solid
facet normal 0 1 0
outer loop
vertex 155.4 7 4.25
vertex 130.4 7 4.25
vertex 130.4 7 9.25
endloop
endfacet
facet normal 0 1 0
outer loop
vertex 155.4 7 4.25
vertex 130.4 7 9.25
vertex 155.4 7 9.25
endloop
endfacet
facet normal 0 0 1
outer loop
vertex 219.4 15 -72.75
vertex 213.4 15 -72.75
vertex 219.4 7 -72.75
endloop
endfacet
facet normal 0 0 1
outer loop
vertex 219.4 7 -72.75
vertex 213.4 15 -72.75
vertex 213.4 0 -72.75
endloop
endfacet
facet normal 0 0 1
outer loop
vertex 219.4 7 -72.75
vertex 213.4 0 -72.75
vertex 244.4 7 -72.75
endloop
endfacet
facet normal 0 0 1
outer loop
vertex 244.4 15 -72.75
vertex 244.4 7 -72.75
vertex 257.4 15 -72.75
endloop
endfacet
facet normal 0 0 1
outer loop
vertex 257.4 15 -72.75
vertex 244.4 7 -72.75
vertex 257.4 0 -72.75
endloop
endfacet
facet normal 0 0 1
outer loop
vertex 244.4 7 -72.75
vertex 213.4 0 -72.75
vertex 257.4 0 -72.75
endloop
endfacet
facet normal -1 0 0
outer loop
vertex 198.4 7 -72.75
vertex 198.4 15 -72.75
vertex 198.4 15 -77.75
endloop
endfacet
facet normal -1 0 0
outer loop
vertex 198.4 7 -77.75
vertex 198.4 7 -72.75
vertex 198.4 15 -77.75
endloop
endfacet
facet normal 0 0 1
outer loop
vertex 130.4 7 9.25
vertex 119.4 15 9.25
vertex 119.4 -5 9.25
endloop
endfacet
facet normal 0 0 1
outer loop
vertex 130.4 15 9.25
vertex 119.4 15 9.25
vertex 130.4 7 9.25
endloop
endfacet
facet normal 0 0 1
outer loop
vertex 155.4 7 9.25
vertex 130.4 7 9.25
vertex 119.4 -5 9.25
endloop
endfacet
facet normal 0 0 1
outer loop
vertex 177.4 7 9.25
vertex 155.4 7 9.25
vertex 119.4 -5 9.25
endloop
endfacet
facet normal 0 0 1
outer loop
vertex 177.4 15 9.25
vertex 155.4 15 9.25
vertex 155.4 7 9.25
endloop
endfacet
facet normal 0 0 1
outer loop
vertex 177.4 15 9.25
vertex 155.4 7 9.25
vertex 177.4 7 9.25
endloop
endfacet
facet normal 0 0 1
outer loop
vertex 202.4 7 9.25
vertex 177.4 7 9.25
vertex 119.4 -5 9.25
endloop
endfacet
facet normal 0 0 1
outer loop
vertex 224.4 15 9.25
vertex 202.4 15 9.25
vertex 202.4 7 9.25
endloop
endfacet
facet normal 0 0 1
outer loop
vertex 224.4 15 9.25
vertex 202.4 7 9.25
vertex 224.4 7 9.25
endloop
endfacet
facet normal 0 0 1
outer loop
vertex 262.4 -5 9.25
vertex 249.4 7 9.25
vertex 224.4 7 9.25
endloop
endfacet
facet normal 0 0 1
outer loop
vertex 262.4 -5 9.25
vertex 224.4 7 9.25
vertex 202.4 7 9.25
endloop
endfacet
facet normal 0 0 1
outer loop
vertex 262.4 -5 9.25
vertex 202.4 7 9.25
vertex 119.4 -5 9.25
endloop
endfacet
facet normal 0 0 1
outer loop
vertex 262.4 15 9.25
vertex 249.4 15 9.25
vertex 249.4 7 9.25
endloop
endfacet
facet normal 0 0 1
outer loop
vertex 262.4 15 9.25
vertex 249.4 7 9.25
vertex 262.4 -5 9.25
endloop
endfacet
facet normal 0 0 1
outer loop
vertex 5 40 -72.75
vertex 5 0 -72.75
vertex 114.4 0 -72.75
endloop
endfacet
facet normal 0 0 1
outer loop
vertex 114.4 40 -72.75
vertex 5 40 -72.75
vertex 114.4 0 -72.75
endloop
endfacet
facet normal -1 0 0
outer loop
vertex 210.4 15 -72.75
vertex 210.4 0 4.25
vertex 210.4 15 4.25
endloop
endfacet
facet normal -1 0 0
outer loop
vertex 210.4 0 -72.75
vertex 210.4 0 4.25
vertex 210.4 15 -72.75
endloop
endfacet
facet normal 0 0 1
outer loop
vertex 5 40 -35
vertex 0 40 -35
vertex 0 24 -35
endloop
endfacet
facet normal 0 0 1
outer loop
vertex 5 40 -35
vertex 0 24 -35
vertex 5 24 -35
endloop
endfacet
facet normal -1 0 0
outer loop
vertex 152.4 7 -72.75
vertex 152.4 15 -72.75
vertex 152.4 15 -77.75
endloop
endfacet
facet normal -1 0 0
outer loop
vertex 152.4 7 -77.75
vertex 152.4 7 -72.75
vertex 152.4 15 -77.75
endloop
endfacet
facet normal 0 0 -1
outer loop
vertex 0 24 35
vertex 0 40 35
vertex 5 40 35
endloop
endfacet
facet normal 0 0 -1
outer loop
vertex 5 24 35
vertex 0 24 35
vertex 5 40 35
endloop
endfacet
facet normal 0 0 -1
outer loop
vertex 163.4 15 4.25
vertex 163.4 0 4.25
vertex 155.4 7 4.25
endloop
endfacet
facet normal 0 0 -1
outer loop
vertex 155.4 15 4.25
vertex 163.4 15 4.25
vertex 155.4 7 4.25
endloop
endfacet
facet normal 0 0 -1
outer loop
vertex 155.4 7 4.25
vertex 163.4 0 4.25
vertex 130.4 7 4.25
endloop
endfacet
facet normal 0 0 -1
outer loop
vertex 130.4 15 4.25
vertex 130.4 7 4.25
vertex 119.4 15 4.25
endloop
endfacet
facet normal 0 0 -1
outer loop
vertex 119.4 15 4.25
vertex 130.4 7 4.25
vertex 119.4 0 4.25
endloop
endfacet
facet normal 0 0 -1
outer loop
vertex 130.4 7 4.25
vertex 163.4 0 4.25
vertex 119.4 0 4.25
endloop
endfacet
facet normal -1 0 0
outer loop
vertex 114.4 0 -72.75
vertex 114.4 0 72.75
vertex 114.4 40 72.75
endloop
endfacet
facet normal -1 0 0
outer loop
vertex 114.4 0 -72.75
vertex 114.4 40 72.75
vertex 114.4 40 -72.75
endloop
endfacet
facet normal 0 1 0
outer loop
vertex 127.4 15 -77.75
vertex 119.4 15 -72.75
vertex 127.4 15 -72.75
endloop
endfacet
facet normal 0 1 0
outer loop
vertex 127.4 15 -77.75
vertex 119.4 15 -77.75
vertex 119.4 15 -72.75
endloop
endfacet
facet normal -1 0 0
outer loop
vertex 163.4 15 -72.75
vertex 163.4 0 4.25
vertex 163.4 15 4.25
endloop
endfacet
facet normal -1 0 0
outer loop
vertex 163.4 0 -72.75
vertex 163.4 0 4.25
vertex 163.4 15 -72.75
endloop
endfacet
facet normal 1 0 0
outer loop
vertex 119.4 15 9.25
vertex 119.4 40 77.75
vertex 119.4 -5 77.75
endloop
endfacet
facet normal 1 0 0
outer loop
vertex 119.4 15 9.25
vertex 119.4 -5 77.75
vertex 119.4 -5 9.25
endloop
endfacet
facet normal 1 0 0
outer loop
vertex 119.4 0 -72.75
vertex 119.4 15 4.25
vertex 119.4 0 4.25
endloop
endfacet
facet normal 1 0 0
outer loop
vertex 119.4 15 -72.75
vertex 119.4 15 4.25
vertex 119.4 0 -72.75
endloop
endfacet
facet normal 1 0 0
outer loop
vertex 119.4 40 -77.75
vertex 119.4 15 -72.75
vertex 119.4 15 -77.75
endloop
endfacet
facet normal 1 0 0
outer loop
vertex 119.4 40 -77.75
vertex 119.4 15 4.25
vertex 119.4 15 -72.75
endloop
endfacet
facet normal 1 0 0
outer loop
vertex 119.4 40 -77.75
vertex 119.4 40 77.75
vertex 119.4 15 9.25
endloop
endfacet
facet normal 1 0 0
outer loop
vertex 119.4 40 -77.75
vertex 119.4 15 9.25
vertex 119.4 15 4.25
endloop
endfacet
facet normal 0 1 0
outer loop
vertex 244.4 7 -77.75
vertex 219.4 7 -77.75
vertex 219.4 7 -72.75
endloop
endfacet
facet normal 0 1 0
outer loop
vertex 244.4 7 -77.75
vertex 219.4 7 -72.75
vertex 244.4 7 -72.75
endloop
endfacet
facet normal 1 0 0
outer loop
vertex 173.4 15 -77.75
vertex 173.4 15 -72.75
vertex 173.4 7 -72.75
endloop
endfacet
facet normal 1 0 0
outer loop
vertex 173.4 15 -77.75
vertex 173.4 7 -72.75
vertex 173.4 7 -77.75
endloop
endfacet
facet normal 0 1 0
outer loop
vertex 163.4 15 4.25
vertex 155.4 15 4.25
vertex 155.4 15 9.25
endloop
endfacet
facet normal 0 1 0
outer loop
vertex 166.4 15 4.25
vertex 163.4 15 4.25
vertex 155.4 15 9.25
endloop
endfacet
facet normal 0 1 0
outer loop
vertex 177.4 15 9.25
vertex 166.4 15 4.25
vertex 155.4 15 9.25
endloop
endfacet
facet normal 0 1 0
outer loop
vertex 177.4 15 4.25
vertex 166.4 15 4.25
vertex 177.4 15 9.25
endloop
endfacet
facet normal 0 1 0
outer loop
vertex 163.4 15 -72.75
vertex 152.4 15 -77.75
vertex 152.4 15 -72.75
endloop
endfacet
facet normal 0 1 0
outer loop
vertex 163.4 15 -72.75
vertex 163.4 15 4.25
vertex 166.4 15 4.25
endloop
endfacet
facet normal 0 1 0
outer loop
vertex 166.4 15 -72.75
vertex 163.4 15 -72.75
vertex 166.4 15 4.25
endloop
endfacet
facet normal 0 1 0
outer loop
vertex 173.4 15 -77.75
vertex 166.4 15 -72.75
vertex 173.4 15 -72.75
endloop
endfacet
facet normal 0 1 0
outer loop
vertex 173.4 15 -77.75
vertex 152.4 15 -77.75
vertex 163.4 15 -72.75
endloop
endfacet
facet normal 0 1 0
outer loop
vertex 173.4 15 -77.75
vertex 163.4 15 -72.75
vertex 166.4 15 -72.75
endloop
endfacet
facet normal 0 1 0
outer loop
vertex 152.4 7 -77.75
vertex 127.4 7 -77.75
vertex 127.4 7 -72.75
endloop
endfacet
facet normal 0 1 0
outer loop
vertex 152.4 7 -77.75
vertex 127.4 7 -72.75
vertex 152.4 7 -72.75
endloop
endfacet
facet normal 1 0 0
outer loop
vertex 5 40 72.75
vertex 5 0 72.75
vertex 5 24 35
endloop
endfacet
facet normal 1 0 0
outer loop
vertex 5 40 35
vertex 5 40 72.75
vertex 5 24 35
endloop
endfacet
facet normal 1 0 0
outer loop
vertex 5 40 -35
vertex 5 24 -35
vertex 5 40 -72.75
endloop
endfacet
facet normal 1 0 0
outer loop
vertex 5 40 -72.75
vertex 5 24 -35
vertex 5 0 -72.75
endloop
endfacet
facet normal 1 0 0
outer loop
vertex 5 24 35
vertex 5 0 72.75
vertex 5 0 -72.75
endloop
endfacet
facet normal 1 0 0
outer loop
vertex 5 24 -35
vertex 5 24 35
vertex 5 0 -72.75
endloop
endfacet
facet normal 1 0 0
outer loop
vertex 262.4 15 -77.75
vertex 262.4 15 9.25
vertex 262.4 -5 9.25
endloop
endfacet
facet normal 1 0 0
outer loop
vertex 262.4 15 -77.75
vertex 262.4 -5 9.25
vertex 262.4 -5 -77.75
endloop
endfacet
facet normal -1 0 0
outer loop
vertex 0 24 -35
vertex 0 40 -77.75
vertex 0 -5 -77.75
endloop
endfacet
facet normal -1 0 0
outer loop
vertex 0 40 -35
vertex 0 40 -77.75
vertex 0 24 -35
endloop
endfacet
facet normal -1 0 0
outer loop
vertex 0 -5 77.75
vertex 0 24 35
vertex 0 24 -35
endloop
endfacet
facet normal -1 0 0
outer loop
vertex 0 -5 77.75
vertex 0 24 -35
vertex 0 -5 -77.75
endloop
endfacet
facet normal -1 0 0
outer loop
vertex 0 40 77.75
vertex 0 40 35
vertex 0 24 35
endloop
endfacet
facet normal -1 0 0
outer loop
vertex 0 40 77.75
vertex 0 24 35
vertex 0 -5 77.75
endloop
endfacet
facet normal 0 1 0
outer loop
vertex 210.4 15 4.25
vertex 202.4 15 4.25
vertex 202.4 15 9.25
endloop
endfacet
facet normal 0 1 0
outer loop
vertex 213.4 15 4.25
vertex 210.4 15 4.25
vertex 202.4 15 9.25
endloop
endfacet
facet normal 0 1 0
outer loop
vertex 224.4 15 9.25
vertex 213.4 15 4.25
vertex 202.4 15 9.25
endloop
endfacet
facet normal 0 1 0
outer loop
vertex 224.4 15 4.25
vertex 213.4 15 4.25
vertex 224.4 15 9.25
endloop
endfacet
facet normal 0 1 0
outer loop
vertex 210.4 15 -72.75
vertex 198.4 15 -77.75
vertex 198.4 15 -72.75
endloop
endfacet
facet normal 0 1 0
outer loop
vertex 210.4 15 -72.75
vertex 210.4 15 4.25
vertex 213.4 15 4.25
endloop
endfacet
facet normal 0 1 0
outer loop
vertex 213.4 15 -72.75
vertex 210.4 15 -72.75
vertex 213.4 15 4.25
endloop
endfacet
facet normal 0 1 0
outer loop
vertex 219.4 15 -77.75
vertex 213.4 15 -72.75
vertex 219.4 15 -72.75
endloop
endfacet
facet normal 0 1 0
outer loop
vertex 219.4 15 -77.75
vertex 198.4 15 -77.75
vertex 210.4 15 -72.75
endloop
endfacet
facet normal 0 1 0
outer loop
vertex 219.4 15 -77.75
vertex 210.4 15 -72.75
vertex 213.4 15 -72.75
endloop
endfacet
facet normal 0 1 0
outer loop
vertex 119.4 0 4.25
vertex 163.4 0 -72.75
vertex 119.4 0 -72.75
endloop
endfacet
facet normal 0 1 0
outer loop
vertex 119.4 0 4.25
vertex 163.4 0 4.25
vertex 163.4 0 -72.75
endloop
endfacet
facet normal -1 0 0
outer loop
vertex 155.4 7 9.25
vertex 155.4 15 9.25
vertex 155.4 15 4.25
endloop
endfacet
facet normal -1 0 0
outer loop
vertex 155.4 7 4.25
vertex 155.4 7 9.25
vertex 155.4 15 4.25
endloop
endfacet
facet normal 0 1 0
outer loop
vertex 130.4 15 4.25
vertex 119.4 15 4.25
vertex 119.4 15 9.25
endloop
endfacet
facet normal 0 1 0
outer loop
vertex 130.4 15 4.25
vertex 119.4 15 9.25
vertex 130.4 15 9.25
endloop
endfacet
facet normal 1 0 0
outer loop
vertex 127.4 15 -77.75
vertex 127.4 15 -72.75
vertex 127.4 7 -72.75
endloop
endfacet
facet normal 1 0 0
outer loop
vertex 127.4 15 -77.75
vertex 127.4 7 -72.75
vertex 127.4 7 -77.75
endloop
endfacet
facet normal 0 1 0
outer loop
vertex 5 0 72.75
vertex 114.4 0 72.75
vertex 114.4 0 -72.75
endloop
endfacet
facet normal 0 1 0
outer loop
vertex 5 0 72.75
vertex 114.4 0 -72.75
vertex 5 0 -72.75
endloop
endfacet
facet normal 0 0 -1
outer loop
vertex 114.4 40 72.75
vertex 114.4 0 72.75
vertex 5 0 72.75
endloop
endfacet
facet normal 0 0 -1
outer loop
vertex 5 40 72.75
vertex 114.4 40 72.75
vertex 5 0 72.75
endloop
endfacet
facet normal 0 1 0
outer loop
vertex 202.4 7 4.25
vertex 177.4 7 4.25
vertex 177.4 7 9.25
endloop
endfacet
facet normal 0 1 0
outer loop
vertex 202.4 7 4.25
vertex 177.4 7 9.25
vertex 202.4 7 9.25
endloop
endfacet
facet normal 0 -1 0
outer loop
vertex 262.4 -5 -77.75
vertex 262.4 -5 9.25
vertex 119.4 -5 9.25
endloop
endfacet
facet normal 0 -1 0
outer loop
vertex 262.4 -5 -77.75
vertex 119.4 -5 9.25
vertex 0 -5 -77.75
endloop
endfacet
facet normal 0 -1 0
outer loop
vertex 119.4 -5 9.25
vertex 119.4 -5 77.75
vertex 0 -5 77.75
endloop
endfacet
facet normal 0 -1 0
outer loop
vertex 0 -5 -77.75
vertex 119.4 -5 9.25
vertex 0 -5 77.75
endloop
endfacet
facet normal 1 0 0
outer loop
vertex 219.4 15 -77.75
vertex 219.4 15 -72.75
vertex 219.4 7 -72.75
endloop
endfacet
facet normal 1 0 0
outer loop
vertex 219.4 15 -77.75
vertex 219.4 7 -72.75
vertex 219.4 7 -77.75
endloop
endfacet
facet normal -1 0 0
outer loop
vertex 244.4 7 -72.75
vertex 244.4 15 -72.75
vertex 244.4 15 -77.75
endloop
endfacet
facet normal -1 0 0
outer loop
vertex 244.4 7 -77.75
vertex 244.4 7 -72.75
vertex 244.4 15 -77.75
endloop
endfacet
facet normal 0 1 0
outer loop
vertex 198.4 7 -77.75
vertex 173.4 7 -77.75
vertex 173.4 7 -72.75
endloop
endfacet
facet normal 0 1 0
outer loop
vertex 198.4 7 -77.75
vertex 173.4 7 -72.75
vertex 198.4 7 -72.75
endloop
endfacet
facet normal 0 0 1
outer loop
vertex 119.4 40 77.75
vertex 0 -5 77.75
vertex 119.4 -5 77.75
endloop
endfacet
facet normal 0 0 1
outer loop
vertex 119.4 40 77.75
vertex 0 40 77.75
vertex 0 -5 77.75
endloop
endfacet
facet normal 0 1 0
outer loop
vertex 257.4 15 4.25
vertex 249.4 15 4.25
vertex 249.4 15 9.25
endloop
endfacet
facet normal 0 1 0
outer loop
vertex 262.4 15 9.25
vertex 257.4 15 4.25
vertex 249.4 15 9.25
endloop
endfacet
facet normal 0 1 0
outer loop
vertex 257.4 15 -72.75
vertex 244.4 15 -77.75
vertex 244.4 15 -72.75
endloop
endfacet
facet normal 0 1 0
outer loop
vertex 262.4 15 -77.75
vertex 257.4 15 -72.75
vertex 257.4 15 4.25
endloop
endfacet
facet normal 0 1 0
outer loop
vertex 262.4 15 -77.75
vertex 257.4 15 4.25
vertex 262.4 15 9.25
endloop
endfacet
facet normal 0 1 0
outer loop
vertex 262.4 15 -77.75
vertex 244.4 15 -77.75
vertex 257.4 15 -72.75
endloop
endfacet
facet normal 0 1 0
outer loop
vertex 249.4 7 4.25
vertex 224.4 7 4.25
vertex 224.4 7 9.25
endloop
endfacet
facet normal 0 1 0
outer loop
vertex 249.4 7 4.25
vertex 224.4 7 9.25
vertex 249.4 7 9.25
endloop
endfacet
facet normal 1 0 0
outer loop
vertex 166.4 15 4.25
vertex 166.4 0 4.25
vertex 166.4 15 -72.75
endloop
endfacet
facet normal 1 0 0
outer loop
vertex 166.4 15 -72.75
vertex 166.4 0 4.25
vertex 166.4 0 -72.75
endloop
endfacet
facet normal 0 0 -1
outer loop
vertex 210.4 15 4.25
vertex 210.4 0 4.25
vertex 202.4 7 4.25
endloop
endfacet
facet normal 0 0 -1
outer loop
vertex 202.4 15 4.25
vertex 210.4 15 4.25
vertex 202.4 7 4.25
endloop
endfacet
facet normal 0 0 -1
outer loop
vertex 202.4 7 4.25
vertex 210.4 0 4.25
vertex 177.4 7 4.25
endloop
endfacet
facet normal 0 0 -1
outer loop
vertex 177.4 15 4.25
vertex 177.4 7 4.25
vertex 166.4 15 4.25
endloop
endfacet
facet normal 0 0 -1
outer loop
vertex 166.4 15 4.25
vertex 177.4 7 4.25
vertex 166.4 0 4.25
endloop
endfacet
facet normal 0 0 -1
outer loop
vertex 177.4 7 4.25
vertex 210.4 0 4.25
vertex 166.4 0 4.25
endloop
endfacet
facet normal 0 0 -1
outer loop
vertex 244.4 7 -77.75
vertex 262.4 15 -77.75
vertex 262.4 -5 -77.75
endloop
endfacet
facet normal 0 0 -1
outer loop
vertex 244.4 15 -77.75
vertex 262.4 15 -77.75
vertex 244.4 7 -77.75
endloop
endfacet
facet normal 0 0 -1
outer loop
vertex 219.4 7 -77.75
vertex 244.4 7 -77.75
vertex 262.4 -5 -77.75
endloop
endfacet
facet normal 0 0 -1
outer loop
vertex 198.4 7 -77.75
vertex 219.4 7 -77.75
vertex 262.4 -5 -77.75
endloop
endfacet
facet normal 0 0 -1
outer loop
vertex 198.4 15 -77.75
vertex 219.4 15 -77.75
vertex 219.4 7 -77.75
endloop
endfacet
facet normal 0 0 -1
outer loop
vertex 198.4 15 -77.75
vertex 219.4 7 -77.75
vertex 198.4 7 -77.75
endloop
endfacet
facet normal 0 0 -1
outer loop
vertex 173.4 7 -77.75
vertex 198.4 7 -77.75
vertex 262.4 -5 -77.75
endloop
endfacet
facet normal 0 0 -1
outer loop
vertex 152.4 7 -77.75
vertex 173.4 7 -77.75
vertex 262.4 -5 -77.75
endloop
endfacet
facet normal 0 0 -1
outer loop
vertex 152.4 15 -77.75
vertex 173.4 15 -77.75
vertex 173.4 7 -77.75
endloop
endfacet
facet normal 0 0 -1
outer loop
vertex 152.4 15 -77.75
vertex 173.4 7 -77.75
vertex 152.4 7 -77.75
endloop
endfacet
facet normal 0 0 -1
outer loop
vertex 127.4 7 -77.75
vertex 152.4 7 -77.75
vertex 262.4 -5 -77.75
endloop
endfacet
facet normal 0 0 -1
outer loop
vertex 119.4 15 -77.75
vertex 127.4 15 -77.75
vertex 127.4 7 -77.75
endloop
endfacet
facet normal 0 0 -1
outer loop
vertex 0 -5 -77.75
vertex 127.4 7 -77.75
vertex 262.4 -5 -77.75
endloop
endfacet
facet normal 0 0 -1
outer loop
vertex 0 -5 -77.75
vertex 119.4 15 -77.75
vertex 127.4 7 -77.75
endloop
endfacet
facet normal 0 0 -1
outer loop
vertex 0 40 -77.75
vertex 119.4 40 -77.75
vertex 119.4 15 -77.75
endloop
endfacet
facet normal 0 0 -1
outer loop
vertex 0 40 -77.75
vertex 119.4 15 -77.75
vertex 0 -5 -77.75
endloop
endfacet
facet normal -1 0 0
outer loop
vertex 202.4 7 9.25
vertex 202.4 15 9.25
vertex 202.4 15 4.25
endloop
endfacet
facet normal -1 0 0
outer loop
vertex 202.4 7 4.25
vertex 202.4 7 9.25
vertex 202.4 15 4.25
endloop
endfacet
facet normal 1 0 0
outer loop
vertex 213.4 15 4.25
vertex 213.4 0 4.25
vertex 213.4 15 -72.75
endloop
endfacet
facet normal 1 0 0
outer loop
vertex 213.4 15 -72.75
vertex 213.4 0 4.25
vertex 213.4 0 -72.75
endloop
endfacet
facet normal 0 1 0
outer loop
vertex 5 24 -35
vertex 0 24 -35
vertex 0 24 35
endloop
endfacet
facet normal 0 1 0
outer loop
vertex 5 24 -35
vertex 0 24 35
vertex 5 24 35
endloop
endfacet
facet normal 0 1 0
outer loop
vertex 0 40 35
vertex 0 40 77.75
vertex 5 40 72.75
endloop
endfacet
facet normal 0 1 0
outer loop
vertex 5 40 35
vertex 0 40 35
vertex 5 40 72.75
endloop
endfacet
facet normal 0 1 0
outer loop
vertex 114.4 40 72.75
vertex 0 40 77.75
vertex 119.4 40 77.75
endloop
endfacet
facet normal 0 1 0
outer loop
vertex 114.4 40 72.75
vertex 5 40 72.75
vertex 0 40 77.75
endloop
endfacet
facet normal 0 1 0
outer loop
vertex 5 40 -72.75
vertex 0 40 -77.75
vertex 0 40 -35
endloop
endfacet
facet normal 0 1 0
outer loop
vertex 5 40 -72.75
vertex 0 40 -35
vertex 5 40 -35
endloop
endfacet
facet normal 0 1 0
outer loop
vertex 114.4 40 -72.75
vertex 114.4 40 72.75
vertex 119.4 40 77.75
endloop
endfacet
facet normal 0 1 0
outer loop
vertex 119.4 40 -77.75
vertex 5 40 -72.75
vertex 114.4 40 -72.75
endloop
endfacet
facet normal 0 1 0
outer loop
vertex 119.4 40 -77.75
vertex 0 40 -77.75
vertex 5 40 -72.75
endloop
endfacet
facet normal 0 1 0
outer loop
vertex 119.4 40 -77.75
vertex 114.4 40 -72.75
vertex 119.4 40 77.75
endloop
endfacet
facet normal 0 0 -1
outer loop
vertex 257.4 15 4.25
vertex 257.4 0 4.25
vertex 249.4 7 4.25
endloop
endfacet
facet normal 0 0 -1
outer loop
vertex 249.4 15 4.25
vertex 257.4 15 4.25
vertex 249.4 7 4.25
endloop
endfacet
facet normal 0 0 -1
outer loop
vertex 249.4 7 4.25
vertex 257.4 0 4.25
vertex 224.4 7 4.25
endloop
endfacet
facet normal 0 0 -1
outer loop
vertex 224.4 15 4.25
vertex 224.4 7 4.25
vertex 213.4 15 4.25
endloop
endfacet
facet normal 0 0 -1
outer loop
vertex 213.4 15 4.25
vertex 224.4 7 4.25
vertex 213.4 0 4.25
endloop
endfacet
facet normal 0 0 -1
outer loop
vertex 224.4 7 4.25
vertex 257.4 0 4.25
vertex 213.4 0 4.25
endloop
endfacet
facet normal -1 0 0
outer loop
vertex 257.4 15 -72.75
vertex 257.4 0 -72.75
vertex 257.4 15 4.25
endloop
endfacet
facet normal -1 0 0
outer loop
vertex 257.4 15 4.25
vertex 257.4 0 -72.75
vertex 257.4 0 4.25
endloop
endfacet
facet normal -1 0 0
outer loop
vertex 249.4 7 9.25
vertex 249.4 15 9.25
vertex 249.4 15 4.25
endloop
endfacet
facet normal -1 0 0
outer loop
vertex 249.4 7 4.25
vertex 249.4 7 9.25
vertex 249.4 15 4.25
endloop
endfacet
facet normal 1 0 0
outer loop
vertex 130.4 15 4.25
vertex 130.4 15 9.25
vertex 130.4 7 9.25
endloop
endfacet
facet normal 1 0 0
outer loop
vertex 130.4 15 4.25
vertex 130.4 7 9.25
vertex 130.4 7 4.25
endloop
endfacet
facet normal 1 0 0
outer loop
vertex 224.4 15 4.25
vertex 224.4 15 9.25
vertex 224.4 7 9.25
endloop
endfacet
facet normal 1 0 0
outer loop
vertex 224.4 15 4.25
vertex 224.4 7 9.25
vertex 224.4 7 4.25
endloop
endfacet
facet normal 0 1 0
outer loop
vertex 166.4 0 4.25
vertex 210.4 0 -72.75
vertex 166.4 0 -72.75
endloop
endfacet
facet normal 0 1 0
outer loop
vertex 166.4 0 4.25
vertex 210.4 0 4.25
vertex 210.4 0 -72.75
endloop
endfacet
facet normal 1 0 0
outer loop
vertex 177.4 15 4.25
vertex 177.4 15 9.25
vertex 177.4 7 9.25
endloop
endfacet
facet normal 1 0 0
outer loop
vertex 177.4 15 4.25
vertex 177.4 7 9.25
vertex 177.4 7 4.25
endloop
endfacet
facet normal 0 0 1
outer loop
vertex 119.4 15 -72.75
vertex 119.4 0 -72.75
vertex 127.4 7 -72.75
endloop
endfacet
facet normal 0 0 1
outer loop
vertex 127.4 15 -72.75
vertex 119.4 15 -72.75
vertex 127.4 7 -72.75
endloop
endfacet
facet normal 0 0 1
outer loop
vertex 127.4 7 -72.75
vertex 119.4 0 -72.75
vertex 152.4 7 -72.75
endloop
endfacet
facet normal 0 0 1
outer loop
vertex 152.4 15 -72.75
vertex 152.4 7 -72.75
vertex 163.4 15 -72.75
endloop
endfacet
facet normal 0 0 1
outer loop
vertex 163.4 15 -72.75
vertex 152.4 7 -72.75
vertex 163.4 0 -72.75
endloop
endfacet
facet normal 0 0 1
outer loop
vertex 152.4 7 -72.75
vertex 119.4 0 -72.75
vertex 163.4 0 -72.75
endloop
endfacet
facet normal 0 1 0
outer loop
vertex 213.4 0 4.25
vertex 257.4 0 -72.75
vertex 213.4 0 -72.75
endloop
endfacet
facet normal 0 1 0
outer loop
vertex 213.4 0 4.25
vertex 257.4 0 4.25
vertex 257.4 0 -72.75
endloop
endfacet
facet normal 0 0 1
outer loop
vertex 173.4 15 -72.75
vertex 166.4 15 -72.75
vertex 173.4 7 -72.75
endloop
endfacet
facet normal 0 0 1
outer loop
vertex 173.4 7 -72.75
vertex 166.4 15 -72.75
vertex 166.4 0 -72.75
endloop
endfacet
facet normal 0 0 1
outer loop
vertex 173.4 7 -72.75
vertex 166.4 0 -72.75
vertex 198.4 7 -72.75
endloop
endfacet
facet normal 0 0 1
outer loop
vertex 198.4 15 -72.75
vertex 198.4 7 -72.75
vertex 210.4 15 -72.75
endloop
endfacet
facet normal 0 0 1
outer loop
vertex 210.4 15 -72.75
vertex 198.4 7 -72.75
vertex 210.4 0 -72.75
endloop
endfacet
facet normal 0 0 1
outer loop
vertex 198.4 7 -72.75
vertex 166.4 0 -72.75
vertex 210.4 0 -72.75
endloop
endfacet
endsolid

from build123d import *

# Parameters (mm, degrees)
BOSS_EXTRUDE1_DEPTH = 40
BOSS_EXTRUDE2_DEPTH = 5
SKETCH4_W           = 5
SKETCH4_H           = 77
SKETCH4_W_2         = 3
BOSS_EXTRUDE3_DEPTH = 40
SKETCH5_W           = 143
SKETCH5_H           = 87
CUT_EXTRUDE1_DEPTH  = 25
SKETCH6_W           = 25
SKETCH6_H           = 5
CUT_EXTRUDE2_DEPTH  = 8
SKETCH7_W           = 5
SKETCH7_H           = 70
CUT_EXTRUDE3_DEPTH  = 16


with BuildPart() as part:
    # Sketch1 → Boss-Extrude1 (new body)
    with BuildSketch(Plane(origin=(0, 0, 0), x_dir=(1, 0, 0), z_dir=(0, 1, 0))):
        Polygon((0, 77.75), (0, -77.75), (119.4, -77.75), (119.4, -9.25), (262.4, -9.25), (262.4, 77.75), align=None)
        Polygon((5, 72.75), (257.4, 72.75), (257.4, -4.25), (114.4, -4.25), (114.4, -72.75), (5, -72.75), align=None, mode=Mode.SUBTRACT)
    extrude(amount=BOSS_EXTRUDE1_DEPTH)

    # Sketch3 → Boss-Extrude2 (add)
    with BuildSketch(Plane.XZ):
        Polygon((119.4, 77.75), (119.4, 9.25), (262.4, 9.25), (262.4, -77.75), (0, -77.75), (0, 77.75), align=None)
    extrude(amount=BOSS_EXTRUDE2_DEPTH)

    # Sketch4 → Boss-Extrude3 (add)
    with BuildSketch(Plane(origin=(0, 0, 0), x_dir=(1, 0, 0), z_dir=(0, 1, 0))):
        with Locations((116.9, 34.25)):
            Rectangle(SKETCH4_W, SKETCH4_H)
        with Locations((164.9, 34.25)):
            Rectangle(SKETCH4_W_2, SKETCH4_H)
        with Locations((211.9, 34.25)):
            Rectangle(SKETCH4_W_2, SKETCH4_H)
    extrude(amount=BOSS_EXTRUDE3_DEPTH)

    # Sketch5 → Cut-Extrude1 (cut)
    with BuildSketch(Plane(origin=(0, 40, 0), x_dir=(1, 0, 0), z_dir=(0, 1, 0))):
        with Locations((190.9, 34.25)):
            Rectangle(SKETCH5_W, SKETCH5_H)
    extrude(amount=-CUT_EXTRUDE1_DEPTH, mode=Mode.SUBTRACT)

    # Sketch6 → Cut-Extrude2 (cut)
    with BuildSketch(Plane(origin=(0, 15, 0), x_dir=(1, 0, 0), z_dir=(0, 1, 0))):
        with Locations((142.9, -6.75)):
            Rectangle(SKETCH6_W, SKETCH6_H)
        with Locations((189.9, -6.75)):
            Rectangle(SKETCH6_W, SKETCH6_H)
        with Locations((236.9, -6.75)):
            Rectangle(SKETCH6_W, SKETCH6_H)
        with Locations((139.9, 75.25)):
            Rectangle(SKETCH6_W, SKETCH6_H)
        with Locations((185.9, 75.25)):
            Rectangle(SKETCH6_W, SKETCH6_H)
        with Locations((231.9, 75.25)):
            Rectangle(SKETCH6_W, SKETCH6_H)
    extrude(amount=-CUT_EXTRUDE2_DEPTH, mode=Mode.SUBTRACT)

    # Sketch7 → Cut-Extrude3 (cut)
    with BuildSketch(Plane(origin=(0, 40, 0), x_dir=(1, 0, 0), z_dir=(0, 1, 0))):
        with Locations((2.5, 0)):
            Rectangle(SKETCH7_W, SKETCH7_H)
    extrude(amount=-CUT_EXTRUDE3_DEPTH, mode=Mode.SUBTRACT)


solid = part.part
